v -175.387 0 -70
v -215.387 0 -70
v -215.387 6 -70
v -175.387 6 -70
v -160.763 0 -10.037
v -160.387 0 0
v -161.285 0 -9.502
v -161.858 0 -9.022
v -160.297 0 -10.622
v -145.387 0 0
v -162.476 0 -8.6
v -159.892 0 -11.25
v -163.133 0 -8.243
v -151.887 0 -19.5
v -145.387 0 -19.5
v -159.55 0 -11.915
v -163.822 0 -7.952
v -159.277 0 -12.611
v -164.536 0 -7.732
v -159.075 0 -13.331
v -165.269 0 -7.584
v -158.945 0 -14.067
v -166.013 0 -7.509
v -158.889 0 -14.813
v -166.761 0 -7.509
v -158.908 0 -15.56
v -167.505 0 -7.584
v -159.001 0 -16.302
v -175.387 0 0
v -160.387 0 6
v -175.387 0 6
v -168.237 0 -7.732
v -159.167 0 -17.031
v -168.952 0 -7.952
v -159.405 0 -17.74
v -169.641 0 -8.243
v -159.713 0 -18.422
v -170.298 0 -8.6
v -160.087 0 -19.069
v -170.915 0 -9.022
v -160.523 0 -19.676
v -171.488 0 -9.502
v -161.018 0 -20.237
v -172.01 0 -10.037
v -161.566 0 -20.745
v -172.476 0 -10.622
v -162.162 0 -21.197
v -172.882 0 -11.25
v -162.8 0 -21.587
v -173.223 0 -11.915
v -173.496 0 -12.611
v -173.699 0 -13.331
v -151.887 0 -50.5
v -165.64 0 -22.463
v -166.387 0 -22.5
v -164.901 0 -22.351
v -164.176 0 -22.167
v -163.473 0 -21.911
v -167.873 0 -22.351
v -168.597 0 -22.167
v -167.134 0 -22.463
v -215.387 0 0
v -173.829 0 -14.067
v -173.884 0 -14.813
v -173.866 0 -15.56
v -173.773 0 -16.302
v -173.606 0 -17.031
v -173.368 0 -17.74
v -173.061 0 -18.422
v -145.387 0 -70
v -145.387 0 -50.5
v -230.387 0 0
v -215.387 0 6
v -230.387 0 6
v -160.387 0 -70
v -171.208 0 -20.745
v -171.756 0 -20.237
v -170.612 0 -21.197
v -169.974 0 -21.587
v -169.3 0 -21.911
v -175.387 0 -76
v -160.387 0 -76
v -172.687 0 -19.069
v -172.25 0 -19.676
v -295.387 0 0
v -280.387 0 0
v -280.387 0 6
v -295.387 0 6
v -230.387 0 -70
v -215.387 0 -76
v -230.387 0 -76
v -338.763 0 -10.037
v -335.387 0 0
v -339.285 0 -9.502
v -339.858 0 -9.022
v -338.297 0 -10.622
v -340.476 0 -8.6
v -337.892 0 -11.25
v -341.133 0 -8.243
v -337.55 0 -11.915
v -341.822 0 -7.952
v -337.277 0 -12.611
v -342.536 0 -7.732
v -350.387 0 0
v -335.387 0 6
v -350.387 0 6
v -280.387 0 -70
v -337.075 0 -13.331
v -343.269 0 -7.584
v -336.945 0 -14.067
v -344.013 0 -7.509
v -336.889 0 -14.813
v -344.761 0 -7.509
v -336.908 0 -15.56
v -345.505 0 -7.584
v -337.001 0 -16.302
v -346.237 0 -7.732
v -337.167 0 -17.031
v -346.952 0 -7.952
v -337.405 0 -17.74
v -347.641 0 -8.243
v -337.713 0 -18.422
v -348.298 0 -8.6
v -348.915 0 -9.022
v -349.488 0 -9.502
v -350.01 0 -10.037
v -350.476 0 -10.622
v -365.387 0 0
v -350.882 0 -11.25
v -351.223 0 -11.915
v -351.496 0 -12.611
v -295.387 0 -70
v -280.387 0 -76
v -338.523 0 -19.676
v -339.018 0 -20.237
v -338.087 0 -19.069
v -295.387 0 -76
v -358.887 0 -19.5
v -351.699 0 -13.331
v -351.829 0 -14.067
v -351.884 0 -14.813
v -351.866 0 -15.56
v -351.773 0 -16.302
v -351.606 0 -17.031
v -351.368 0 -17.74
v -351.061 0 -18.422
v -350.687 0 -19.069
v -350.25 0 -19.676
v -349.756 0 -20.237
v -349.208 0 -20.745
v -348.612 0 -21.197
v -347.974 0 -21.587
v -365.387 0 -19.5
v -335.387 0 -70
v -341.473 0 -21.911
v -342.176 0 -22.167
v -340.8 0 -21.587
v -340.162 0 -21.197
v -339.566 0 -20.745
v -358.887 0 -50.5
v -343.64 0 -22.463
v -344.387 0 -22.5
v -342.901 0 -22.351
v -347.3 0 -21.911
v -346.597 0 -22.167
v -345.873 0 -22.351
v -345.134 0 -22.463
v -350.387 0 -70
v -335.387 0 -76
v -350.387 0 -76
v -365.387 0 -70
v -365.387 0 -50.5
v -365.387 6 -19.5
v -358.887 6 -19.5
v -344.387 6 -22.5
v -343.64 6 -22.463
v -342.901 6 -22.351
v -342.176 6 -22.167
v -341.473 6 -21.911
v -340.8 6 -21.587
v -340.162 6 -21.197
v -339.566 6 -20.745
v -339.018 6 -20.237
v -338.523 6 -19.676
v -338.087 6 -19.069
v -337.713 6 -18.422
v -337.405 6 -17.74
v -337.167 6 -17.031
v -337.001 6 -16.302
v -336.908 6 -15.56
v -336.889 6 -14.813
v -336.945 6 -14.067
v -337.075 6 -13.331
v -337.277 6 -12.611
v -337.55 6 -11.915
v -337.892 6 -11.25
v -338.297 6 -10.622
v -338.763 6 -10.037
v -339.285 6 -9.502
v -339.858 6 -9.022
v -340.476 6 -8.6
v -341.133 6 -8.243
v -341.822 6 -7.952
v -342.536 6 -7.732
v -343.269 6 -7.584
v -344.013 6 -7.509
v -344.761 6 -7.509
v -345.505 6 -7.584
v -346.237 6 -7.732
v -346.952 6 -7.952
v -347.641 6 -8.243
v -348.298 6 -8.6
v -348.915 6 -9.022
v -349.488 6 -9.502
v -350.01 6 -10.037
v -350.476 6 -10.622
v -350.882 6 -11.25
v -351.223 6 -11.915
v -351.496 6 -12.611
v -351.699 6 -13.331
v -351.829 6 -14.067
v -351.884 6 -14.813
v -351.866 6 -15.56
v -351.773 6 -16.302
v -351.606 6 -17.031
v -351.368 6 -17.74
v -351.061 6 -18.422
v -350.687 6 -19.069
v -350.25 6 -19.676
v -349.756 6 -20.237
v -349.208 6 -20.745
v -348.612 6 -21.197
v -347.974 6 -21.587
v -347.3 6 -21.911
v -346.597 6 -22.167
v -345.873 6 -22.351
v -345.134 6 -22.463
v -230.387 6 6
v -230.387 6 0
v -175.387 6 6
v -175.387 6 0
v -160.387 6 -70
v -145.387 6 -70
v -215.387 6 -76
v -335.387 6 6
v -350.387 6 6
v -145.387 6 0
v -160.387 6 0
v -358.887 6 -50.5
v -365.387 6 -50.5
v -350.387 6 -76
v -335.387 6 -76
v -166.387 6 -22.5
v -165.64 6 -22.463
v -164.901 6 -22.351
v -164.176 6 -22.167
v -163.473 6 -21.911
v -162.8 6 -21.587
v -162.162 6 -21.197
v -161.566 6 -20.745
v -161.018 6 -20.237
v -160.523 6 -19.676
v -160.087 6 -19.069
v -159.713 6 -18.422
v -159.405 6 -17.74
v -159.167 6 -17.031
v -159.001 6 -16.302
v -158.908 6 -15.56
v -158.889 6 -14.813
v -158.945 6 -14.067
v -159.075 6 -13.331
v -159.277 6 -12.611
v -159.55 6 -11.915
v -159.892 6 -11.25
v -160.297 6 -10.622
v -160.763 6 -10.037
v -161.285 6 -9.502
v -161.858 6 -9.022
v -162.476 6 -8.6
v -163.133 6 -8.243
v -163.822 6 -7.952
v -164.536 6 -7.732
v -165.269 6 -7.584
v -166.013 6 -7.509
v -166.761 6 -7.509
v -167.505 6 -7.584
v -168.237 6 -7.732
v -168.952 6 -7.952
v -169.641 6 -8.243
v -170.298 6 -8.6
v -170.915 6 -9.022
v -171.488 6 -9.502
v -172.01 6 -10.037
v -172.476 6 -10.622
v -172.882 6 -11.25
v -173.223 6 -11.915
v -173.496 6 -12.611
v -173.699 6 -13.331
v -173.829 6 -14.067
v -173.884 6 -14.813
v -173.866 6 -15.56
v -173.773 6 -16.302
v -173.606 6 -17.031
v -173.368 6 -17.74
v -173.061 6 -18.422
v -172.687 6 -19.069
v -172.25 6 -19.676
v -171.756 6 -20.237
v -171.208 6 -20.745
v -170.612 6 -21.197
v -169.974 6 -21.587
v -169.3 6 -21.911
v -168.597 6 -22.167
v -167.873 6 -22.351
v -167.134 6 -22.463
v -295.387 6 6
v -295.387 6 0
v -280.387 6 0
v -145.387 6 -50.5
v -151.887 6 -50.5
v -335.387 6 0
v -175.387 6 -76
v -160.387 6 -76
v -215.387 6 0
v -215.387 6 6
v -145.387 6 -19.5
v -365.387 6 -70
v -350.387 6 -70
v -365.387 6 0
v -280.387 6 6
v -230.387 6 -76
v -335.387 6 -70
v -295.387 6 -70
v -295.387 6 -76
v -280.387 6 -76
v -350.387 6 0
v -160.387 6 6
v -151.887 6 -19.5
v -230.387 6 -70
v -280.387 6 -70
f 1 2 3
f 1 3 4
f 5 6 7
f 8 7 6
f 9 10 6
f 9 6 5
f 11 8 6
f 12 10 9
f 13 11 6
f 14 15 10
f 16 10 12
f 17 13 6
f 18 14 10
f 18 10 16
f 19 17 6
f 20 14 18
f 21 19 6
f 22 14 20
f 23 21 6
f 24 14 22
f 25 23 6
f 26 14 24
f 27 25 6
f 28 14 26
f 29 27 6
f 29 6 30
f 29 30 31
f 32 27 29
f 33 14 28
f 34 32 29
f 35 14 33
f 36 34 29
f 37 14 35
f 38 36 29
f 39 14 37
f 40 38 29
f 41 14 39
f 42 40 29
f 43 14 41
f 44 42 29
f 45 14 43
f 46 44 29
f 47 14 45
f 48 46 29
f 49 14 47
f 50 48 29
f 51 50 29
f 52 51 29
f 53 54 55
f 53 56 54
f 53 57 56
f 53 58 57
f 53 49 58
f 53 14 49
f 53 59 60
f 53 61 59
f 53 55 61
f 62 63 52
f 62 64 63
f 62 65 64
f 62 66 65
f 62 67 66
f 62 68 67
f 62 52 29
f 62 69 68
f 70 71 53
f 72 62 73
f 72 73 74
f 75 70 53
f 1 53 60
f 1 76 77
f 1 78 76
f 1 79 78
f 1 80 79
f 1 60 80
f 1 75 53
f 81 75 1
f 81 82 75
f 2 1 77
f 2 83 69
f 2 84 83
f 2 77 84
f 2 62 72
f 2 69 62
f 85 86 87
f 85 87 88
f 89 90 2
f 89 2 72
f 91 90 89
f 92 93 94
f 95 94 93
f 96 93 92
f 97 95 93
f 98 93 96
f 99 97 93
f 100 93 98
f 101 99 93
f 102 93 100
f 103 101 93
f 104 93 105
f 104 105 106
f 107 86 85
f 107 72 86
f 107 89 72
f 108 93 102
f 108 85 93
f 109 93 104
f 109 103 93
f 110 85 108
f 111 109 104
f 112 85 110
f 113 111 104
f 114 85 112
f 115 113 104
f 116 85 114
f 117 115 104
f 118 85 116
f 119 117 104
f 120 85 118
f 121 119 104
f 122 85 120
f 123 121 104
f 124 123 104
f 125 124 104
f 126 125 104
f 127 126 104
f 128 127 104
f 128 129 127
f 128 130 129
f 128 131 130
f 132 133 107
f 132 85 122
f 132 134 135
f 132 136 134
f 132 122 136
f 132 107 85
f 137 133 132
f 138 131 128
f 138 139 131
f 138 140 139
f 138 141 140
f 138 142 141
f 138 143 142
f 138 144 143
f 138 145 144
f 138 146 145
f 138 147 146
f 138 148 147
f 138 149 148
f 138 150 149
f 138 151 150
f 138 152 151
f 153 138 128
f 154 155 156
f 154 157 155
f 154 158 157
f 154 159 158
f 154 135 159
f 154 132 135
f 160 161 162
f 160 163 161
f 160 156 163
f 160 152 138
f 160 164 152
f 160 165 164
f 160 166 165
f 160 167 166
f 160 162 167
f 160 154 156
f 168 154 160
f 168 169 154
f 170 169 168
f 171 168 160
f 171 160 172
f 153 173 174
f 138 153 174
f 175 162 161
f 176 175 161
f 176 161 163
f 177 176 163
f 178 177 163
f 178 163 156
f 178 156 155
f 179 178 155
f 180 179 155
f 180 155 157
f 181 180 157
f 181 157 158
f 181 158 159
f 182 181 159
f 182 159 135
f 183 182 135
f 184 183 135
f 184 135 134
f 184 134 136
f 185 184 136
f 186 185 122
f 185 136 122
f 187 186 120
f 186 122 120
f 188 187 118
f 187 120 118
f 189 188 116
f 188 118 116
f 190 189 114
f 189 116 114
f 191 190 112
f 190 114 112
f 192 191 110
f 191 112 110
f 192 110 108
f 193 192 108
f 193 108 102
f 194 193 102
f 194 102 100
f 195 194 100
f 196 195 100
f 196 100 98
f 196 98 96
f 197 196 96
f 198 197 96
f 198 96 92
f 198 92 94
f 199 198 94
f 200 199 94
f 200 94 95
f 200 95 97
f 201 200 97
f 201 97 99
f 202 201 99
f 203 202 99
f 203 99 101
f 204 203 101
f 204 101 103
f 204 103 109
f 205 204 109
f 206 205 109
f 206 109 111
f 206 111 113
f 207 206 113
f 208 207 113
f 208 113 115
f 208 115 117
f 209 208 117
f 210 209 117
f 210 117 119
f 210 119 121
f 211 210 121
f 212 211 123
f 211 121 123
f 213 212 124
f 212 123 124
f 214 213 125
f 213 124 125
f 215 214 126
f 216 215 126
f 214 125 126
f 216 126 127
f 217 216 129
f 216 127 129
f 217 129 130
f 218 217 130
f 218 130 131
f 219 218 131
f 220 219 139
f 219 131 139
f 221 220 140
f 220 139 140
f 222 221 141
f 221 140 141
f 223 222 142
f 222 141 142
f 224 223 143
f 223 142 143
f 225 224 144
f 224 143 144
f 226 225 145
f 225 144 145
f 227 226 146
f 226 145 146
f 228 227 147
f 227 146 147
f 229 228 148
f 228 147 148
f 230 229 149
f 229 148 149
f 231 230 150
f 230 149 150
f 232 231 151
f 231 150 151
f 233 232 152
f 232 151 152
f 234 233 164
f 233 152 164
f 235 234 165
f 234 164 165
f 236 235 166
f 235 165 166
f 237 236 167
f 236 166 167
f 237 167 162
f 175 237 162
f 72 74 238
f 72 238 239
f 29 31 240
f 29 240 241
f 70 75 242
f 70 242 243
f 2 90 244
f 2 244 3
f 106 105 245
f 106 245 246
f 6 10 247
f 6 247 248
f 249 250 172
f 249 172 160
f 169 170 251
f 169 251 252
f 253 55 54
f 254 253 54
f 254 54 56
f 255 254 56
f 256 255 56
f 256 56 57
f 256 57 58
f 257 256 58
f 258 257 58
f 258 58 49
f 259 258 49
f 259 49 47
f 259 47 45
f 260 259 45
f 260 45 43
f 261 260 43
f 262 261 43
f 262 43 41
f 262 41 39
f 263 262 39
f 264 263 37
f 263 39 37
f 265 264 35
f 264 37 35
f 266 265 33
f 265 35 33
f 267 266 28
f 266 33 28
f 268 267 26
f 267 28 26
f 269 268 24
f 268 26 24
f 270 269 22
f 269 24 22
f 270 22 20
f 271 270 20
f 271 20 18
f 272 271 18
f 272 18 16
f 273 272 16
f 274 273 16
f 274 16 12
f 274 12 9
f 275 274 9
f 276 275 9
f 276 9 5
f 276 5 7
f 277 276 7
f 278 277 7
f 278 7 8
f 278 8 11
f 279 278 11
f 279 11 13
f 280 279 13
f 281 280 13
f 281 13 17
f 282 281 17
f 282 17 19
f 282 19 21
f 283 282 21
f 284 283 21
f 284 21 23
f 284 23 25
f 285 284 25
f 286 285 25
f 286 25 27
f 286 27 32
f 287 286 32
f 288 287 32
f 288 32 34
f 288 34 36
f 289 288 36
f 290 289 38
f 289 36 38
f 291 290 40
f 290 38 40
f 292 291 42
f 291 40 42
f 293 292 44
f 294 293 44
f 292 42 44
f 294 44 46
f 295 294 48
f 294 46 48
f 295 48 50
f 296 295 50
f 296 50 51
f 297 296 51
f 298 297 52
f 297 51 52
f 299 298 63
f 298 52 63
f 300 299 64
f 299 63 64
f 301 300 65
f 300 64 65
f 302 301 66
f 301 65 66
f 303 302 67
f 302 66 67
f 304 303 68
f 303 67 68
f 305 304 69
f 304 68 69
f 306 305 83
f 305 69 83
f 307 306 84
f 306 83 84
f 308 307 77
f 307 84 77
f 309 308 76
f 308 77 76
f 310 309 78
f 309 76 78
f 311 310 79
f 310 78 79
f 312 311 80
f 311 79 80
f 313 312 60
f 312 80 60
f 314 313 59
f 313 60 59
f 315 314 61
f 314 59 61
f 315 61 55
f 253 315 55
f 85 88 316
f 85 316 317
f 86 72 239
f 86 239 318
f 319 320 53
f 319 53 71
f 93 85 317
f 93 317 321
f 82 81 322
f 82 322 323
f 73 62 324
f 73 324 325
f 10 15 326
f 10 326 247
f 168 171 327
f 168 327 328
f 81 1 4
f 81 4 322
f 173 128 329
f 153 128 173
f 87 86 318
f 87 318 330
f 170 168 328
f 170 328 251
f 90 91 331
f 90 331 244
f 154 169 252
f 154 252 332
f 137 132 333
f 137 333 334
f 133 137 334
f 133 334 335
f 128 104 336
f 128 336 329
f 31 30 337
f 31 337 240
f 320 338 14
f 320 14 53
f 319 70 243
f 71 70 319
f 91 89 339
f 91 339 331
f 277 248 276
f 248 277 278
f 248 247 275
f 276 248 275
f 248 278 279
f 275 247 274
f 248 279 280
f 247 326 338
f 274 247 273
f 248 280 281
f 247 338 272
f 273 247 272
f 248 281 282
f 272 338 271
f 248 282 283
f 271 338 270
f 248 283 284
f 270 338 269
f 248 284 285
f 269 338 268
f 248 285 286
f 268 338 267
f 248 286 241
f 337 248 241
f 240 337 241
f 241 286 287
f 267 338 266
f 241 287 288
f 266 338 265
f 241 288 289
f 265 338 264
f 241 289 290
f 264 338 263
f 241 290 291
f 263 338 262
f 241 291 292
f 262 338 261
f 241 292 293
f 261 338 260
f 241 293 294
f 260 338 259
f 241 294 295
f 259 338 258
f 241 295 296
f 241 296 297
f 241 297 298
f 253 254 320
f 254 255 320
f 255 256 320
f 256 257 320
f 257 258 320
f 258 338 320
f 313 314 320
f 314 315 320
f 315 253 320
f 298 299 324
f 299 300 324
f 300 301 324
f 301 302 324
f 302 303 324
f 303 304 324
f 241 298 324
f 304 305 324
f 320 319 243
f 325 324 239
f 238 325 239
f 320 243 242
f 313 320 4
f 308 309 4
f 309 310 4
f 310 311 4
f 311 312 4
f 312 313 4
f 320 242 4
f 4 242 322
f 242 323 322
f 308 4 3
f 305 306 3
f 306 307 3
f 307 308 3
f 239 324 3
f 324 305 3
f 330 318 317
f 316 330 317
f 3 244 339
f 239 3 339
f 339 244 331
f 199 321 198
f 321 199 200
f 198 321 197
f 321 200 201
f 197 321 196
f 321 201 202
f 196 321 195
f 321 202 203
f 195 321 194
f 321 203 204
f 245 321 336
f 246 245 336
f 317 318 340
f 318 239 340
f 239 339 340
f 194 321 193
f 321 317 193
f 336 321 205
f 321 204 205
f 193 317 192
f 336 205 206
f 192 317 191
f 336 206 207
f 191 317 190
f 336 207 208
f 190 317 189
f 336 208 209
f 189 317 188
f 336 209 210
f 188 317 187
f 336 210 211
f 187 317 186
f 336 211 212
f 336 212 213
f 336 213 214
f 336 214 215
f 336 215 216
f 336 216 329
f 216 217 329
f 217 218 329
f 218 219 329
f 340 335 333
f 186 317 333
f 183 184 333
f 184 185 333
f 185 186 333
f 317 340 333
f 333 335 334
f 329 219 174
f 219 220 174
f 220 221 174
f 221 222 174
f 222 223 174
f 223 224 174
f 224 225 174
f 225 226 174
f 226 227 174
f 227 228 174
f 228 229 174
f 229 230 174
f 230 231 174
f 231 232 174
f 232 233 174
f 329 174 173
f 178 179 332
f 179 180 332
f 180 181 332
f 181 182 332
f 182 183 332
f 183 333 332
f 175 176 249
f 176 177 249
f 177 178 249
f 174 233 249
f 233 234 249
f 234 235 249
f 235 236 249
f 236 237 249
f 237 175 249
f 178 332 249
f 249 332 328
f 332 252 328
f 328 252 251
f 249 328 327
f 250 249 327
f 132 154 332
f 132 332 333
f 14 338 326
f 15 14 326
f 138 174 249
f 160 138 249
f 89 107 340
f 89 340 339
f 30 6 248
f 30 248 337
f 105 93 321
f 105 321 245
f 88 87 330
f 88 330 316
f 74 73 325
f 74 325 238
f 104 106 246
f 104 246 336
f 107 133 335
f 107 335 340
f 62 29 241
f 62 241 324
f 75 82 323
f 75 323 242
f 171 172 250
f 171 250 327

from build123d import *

# Parameters (mm, degrees)
BOSS_EXTRUDE1_DEPTH = 6
CAVITY1_START       = -365.386748432
CAVITY1_OUTLINE_W   = 6
CAVITY1_OUTLINE_H   = 30
CAVITY1_DEPTH       = 6
CAVITY1_START_2     = -151.386748432
CAVITY1_2_OUTLINE_W = 6
CAVITY1_2_OUTLINE_H = 30
CAVITY1_2_DEPTH     = 6
SKETCH2_R           = 7.5
CUT_EXTRUDE1_DEPTH  = 10
SKETCH3_W           = 6.5
SKETCH3_H           = 31
CUT_EXTRUDE2_DEPTH  = 10


# Read off the part's stored shape, not the designer's step: Cavity1
with BuildPart() as part:
    # Sketch1 → Boss-Extrude1 (new body)
    with BuildSketch(Plane(origin=(0, 0, 0), x_dir=(1, 0, 0), z_dir=(0, 1, 0))):
        Polygon((-160.386748432, 70), (-145.386748432, 70), (-145.386748432, 0), (-160.386748432, 0), (-160.386748432, -6), (-175.386748432, -6), (-175.386748432, 0), (-215.386748432, 0), (-215.386748432, -6), (-230.386748432, -6), (-230.386748432, 0), (-280.386748432, 0), (-280.386748432, -6), (-295.386748432, -6), (-295.386748432, 0), (-335.386748432, 0), (-335.386748432, -6), (-350.386748432, -6), (-350.386748432, 0), (-365.386748432, 0), (-365.386748432, 70), (-350.386748432, 70), (-350.386748432, 76), (-335.386748432, 76), (-335.386748432, 70), (-295.386748432, 70), (-295.386748432, 76), (-280.386748432, 76), (-280.386748432, 70), (-230.386748432, 70), (-230.386748432, 76), (-215.386748432, 76), (-215.386748432, 70), (-175.386748432, 70), (-175.386748432, 76), (-160.386748432, 76), align=None)
    extrude(amount=BOSS_EXTRUDE1_DEPTH)

    # Cavity1 outline → Cavity1 (cut)
    with BuildSketch(Plane.YZ.offset(CAVITY1_START)):
        with Locations((3, -35)):
            Rectangle(CAVITY1_OUTLINE_W, CAVITY1_OUTLINE_H)
    extrude(amount=CAVITY1_DEPTH, mode=Mode.SUBTRACT)

    # Cavity1 2 outline → Cavity1 2 (cut)
    with BuildSketch(Plane.YZ.offset(CAVITY1_START_2)):
        with Locations((3, -35)):
            Rectangle(CAVITY1_2_OUTLINE_W, CAVITY1_2_OUTLINE_H)
    extrude(amount=CAVITY1_2_DEPTH, mode=Mode.SUBTRACT)

    # Sketch2 → Cut-Extrude1 (cut)
    with BuildSketch(Plane.XZ):
        with Locations(Location((-166.386748432, -15, 0), (0, 0, 270))):
            Circle(SKETCH2_R)
        with Locations(Location((-344.386748432, -15, 0), (0, 0, 270))):
            Circle(SKETCH2_R)
    extrude(amount=-CUT_EXTRUDE1_DEPTH, mode=Mode.SUBTRACT)

    # Sketch3 → Cut-Extrude2 (cut)
    with BuildSketch(Plane(origin=(0, 6, 0), x_dir=(1, 0, 0), z_dir=(0, 1, 0))):
        with Locations((-148.636748432, 35)):
            Rectangle(SKETCH3_W, SKETCH3_H)
        with Locations((-362.136748432, 35)):
            Rectangle(SKETCH3_W, SKETCH3_H)
    extrude(amount=-CUT_EXTRUDE2_DEPTH, mode=Mode.SUBTRACT)


solid = part.part
